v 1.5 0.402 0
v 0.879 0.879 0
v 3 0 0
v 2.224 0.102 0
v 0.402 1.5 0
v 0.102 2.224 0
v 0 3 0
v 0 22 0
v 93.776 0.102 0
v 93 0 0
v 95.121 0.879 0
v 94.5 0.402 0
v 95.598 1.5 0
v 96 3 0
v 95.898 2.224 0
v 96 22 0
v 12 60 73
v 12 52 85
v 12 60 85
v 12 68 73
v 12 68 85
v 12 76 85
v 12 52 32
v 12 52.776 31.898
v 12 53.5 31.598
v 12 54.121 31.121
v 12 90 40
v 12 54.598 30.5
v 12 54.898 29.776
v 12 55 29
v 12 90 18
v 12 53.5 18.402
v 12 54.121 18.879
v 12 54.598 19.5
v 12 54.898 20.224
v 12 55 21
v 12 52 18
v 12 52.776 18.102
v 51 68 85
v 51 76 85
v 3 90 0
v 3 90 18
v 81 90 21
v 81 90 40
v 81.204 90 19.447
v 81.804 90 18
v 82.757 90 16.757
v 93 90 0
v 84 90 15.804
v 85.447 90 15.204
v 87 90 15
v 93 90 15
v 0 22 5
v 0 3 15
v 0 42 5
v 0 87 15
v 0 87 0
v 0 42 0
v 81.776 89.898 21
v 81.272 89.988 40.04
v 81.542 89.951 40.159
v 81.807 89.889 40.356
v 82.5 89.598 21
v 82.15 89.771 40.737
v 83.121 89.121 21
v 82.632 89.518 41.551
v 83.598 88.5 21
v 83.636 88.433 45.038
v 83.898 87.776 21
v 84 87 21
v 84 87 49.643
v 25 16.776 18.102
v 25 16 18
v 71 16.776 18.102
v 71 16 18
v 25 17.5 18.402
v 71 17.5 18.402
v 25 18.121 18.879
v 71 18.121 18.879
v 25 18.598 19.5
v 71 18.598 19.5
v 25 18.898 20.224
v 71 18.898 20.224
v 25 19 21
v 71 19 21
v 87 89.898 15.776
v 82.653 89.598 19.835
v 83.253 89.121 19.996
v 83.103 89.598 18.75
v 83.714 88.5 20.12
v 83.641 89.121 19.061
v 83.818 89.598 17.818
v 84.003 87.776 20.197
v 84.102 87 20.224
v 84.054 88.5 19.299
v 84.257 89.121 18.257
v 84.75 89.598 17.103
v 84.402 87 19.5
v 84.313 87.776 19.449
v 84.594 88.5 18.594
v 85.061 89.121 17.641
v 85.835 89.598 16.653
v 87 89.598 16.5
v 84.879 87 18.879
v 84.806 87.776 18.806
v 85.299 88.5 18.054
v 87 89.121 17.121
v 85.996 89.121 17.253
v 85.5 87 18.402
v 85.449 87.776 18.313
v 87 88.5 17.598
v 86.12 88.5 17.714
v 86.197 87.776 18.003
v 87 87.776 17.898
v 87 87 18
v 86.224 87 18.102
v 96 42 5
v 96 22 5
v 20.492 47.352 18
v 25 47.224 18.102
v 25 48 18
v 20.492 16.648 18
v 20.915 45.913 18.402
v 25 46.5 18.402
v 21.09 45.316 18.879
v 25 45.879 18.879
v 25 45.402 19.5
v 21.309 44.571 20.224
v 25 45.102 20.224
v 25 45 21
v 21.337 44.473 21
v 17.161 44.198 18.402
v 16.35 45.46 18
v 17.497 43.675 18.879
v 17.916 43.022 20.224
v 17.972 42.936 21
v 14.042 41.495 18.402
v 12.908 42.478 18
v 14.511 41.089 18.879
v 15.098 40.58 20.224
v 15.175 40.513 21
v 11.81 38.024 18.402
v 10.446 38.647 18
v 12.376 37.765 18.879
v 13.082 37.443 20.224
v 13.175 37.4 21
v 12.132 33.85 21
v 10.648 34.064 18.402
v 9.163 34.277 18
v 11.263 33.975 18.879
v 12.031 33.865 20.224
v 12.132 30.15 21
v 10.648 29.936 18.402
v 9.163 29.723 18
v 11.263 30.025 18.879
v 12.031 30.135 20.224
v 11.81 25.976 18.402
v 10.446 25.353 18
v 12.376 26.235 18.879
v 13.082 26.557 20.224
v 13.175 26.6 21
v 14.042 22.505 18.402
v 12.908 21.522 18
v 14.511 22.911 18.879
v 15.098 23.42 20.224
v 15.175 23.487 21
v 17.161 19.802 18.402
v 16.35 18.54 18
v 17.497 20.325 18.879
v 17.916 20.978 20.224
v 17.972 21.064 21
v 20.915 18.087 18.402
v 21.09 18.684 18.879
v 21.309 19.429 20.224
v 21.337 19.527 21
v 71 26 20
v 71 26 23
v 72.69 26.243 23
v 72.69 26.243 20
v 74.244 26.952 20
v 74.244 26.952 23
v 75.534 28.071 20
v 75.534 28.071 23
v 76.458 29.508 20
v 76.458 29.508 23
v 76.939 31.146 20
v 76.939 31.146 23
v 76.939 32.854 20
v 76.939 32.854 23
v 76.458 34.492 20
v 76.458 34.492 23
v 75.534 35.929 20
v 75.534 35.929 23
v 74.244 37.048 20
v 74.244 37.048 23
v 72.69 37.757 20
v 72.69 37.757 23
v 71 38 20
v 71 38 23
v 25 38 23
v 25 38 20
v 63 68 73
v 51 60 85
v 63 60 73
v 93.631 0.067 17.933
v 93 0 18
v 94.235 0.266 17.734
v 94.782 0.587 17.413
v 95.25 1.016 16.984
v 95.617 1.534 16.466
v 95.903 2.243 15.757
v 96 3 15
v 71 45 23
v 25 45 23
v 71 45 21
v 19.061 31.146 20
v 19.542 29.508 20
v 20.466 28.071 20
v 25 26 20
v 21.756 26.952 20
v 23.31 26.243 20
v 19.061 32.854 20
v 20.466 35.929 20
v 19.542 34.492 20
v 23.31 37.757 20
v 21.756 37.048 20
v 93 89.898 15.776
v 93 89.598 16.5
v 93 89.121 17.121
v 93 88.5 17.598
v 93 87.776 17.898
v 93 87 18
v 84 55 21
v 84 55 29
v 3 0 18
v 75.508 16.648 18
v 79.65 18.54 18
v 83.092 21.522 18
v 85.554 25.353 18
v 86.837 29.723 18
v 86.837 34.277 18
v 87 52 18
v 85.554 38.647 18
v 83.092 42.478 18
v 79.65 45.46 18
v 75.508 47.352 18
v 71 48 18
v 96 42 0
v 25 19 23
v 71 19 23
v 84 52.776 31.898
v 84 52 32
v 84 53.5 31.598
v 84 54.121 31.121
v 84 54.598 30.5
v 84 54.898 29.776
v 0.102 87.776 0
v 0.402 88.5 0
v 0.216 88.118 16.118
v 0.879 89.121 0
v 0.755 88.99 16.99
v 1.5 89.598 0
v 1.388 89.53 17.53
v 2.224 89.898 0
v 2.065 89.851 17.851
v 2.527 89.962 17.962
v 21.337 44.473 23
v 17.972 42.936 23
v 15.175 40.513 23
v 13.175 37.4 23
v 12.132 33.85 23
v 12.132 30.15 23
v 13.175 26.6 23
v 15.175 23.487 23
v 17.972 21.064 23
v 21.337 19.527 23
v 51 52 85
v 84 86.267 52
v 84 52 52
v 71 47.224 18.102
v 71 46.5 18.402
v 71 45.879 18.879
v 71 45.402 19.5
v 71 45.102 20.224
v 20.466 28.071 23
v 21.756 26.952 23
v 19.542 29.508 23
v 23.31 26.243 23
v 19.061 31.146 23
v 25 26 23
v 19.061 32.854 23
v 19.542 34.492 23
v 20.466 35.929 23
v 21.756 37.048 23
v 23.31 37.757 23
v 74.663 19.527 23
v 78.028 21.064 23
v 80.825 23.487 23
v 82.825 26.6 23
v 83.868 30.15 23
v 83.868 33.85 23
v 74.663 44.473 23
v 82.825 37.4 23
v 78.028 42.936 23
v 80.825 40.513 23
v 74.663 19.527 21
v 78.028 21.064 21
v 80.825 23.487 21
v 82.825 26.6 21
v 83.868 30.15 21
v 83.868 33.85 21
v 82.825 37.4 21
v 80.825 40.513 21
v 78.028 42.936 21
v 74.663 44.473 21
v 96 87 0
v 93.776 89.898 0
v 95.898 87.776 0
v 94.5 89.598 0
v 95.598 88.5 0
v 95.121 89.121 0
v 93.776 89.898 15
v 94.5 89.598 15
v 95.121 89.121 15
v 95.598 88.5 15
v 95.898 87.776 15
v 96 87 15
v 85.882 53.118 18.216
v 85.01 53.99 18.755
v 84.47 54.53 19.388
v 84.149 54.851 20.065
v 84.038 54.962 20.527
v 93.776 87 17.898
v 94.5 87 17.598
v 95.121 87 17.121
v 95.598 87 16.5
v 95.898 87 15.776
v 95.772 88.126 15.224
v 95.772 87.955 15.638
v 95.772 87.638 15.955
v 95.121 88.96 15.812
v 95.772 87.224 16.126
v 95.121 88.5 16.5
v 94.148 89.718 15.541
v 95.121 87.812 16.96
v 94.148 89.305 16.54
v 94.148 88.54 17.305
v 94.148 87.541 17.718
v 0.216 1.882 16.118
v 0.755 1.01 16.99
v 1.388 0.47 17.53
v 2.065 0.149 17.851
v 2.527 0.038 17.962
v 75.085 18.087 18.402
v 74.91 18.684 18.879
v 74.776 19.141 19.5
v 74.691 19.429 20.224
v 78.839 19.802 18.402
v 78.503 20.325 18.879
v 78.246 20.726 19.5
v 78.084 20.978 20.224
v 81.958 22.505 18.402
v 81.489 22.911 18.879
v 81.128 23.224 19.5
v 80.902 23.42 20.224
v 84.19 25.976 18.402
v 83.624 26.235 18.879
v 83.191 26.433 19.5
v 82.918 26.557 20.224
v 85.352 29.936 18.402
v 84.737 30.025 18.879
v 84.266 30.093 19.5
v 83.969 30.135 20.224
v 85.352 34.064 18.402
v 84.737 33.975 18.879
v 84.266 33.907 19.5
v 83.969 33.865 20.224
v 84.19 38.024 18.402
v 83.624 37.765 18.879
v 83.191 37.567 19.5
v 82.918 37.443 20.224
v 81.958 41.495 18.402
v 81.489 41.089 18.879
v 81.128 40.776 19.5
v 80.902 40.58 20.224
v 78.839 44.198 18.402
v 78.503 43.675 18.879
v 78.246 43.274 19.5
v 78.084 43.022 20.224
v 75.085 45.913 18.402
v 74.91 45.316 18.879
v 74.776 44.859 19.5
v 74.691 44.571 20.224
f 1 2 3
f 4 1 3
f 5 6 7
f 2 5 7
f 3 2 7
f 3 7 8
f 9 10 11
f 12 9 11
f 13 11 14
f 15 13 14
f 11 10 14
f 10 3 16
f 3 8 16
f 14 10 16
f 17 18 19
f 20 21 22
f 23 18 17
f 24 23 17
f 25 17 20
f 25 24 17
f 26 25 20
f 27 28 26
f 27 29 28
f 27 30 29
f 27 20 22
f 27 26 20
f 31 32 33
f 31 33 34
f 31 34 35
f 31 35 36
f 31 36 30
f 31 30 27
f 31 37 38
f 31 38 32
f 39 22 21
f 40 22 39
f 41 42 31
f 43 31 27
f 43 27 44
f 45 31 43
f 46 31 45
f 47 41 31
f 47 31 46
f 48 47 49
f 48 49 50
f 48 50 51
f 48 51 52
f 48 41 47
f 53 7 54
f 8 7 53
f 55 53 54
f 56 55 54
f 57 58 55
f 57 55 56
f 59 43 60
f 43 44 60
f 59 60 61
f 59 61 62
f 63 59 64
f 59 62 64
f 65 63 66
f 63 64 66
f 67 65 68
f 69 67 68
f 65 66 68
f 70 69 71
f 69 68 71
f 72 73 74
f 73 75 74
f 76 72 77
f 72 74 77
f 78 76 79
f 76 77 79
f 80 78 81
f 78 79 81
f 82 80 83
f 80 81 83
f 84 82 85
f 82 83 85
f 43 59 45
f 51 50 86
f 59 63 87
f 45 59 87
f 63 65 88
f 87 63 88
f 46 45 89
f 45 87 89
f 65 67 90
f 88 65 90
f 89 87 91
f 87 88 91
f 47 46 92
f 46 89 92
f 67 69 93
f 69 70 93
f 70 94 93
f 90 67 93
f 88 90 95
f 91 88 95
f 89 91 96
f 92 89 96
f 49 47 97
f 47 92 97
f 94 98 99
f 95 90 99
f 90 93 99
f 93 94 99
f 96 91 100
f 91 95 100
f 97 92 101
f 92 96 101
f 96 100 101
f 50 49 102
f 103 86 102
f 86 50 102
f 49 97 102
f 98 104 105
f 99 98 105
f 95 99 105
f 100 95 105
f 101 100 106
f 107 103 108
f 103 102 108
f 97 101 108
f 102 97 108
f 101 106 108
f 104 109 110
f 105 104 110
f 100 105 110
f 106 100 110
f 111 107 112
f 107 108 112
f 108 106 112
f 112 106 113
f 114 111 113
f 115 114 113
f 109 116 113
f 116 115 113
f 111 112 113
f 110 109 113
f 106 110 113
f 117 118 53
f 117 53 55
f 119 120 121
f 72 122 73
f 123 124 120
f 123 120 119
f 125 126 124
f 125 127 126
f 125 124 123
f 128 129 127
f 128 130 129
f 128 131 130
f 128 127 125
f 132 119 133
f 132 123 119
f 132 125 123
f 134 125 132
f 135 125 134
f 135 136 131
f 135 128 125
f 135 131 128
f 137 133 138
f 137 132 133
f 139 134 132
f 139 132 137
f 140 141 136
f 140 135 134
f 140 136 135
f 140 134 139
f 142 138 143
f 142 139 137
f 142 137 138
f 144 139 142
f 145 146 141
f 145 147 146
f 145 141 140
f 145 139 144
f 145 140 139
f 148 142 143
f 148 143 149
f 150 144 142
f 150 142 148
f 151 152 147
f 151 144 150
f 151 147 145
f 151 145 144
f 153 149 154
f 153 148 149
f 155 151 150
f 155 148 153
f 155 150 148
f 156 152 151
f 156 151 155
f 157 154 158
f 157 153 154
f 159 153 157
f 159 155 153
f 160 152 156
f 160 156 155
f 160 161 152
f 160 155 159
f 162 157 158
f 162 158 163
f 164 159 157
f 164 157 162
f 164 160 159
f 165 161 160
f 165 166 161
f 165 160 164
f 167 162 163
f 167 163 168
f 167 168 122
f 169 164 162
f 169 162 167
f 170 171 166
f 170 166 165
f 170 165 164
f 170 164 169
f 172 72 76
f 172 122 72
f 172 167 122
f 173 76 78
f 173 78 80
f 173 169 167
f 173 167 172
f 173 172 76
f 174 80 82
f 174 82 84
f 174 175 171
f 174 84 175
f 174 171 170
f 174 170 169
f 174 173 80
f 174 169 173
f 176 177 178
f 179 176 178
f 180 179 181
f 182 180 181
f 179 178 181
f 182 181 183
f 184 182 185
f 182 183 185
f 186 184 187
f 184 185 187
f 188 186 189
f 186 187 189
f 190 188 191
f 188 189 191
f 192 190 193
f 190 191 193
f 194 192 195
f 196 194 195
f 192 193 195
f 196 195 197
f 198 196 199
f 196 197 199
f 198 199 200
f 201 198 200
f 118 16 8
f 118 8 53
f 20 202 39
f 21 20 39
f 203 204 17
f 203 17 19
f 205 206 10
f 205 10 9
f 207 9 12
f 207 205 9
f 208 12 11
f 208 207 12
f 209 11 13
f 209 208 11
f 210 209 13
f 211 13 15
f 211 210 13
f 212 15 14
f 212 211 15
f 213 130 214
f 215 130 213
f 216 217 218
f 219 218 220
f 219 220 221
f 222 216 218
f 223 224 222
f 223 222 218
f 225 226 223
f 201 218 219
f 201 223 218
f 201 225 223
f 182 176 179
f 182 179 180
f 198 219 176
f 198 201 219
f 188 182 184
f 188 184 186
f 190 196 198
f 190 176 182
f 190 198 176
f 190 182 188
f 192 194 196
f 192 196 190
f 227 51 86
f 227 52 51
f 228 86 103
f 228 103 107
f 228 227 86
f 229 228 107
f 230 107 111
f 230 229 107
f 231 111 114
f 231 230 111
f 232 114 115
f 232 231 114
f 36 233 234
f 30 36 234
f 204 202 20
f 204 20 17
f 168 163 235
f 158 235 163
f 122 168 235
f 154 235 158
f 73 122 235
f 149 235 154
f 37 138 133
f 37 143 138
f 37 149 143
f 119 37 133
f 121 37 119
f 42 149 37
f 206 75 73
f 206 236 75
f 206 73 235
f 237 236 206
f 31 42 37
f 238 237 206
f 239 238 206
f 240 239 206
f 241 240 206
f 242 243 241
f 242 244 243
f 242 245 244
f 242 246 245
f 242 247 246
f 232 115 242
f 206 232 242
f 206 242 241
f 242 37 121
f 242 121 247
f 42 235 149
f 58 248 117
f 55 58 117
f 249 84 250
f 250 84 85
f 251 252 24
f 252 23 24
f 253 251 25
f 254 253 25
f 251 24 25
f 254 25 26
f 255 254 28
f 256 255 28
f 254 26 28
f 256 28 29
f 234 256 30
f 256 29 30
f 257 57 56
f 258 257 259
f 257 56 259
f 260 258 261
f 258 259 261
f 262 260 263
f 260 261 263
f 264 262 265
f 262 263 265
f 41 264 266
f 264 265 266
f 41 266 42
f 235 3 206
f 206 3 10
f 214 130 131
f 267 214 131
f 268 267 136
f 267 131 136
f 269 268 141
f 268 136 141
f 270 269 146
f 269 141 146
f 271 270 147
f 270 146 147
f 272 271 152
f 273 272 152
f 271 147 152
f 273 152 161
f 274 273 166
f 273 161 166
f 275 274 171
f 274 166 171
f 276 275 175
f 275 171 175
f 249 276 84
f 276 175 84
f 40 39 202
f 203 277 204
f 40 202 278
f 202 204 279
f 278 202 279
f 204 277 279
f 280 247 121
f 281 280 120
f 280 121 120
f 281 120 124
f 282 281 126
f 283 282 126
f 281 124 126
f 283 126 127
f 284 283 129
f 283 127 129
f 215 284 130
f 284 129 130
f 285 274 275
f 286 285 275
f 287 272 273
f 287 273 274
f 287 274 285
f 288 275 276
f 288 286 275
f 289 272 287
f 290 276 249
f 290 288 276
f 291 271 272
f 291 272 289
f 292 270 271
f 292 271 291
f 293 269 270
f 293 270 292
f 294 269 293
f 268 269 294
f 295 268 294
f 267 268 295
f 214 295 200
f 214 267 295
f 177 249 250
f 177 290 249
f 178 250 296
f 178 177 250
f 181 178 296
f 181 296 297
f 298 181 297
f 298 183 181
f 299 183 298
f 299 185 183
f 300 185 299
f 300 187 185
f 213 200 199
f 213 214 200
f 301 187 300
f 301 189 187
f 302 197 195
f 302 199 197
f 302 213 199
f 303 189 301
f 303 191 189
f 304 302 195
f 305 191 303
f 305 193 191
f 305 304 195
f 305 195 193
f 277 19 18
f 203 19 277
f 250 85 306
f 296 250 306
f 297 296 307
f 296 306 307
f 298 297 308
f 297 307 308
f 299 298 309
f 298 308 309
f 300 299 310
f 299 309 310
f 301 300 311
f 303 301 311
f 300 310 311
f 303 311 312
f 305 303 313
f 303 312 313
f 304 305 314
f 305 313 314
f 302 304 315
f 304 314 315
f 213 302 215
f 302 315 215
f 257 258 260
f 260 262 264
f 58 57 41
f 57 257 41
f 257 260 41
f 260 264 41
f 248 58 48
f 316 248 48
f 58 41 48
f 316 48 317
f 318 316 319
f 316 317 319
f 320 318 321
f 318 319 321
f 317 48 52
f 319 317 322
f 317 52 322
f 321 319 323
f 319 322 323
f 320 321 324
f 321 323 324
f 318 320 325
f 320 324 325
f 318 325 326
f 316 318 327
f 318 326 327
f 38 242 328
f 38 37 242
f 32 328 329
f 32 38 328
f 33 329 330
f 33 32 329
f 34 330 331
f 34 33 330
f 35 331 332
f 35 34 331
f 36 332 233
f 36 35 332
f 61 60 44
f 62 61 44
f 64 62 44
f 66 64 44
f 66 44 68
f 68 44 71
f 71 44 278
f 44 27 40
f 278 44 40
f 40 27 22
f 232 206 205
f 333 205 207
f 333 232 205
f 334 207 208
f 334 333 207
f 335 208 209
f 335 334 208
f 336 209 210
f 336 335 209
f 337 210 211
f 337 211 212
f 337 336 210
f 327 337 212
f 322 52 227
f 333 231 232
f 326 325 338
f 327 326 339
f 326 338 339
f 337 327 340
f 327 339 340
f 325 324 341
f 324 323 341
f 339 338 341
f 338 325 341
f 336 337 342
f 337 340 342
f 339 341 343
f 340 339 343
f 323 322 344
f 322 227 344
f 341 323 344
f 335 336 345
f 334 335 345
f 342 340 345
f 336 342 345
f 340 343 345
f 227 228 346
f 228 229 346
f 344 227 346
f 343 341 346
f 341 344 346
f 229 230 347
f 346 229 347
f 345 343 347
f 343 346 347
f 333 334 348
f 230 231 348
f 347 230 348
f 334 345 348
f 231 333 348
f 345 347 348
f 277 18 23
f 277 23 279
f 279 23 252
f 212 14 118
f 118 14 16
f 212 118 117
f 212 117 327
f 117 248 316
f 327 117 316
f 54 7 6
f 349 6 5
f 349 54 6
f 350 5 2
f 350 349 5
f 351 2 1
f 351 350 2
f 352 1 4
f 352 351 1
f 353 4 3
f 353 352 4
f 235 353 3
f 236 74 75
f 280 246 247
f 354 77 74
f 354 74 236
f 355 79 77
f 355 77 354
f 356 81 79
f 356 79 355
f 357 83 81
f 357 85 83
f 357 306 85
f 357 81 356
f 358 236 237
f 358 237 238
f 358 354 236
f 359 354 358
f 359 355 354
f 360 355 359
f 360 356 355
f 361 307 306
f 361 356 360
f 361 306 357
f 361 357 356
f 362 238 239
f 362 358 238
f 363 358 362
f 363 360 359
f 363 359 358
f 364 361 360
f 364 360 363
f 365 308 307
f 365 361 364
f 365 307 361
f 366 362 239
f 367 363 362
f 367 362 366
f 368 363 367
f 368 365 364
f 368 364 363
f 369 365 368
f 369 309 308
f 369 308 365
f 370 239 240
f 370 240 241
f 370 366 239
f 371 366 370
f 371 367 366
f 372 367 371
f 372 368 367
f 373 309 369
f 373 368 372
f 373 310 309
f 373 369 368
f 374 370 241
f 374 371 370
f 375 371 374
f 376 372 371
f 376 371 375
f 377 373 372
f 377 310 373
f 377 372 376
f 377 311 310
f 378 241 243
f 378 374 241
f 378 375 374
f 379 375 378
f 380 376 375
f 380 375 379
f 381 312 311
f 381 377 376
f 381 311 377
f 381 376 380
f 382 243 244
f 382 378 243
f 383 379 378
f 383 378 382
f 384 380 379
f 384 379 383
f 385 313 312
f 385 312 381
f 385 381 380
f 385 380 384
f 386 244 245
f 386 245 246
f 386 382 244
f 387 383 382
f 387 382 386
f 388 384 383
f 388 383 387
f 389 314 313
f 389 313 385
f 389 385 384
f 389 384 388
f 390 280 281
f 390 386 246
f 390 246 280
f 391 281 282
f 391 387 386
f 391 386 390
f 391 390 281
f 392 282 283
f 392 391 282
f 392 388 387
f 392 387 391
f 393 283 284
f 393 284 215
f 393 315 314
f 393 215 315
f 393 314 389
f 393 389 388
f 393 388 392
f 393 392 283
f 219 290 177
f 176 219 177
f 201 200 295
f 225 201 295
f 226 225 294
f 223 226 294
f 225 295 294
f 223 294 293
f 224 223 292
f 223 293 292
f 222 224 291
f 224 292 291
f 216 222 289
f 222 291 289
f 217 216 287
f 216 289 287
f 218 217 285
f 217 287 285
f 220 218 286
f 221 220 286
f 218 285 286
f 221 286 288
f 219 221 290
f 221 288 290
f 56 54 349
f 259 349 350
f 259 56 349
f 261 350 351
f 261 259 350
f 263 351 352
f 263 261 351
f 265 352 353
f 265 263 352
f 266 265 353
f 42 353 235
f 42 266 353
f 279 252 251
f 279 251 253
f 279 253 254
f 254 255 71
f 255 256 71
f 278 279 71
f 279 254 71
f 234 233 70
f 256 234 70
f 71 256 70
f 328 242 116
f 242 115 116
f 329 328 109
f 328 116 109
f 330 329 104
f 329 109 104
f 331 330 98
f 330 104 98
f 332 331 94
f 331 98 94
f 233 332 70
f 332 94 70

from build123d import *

# Parameters (mm, degrees)
F0_W      = 96
F0_H      = 90
F1_DEPTH  = 18
F2_W      = 72
F2_H      = 38
F4_DEPTH  = 67
F6_DEPTH  = 38
F7_W      = 8
F7_H      = 12
F8_DEPTH  = 51.001
F10_DEPTH = 72.001
F11_W     = 20
F11_H     = 5
F12_DEPTH = 96
F13_W     = 46
F13_H     = 26
F14_DEPTH = 5
F16_DEPTH = 3
F17_W     = 3
F17_H     = 14
F18_DEPTH = 72
F19_R     = 2.99999


# Not quite as in the source:
# - a fillet or chamfer is up to 0.001 mm smaller than in the source, because OpenCascade refuses the exact size


with BuildPart() as f1:
    # F0 (on Top) → F1 (new body)
    with BuildSketch(Plane.XY):
        with Locations((48, 45)):
            Rectangle(F0_W, F0_H)
    extrude(amount=F1_DEPTH)

    # F2 (on face) → F4 (join, through all)
    with BuildSketch(Plane.XY.offset(18)):
        with Locations((48, 71)):
            Rectangle(F2_W, F2_H)
    extrude(amount=F4_DEPTH)

    # F5 (on face) → F6 (cut)
    with BuildSketch(Plane.XZ.offset(-52)):
        Polygon((84, 52), (84, 85), (51, 85), align=None)
    extrude(amount=-F6_DEPTH, mode=Mode.SUBTRACT)

    # F7 (on face) → F8 (cut, through all)
    with BuildSketch(Plane(origin=(12, 0, 0), x_dir=(0, -1, 0), z_dir=(-1, 0, 0))):
        with Locations((-64, 79)):
            Rectangle(F7_W, F7_H)
    extrude(amount=-F8_DEPTH, mode=Mode.SUBTRACT)

    # F9 (on face) → F10 (cut, through all)
    with BuildSketch(Plane(origin=(12, 0, 0), x_dir=(0, -1, 0), z_dir=(-1, 0, 0))):
        Polygon((-76, 85), (-90, 85), (-90, 40), align=None)
    extrude(amount=-F10_DEPTH, mode=Mode.SUBTRACT)

    # F11 (on face) → F12 (cut, through all)
    with BuildSketch(Plane.YZ.offset(96)):
        with Locations((32, 2.5)):
            Rectangle(F11_W, F11_H)
    extrude(amount=-F12_DEPTH, mode=Mode.SUBTRACT)

    # F13 (on face) → F14 (join)
    with BuildSketch(Plane.XY.offset(18)):
        with Locations((48, 32)):
            Rectangle(F13_W, F13_H)
        with BuildLine():
            Line((25, 19), (25, 45))
            ThreePointArc((25, 45), (12, 32), (25, 19))
        make_face()
        with BuildLine():
            ThreePointArc((71, 19), (84, 32), (71, 45))
            Line((71, 45), (71, 19))
        make_face()
    extrude(amount=F14_DEPTH)

    # F15 (on face) → F16 (cut)
    with BuildSketch(Plane.XY.offset(23)):
        with BuildLine():
            ThreePointArc((25, 38), (19, 32), (25, 26))
            Line((25, 26), (71, 26))
            ThreePointArc((71, 26), (77, 32), (71, 38))
            Line((71, 38), (25, 38))
        make_face()
    extrude(amount=-F16_DEPTH, mode=Mode.SUBTRACT)

    # F17 (on face) → F18 (cut, through all)
    with BuildSketch(Plane.YZ.offset(84)):
        with Locations((53.5, 25)):
            Rectangle(F17_W, F17_H)
    extrude(amount=-F18_DEPTH, mode=Mode.SUBTRACT)

    # F19 (radius 3 in the source; OpenCascade refuses exactly that, so slightly less here)
    f19_edges = [f1.edges().sort_by_distance(p)[0] for p in [
        (48, 19, 18),
        (48, 55, 18),
        (48, 55, 32),
        (90, 90, 18),
        (96, 0, 9),
        (96, 90, 9),
        (0, 90, 9),
        (0, 0, 9),
        (0, 45, 18),
        (96, 45, 18),
        (84, 72.5, 18),
        (48, 45, 18),
        (84, 32, 18),
        (12, 32, 18),
        (84, 90, 29),
    ]]
    fillet(f19_edges, radius=F19_R)


solid = f1.part
